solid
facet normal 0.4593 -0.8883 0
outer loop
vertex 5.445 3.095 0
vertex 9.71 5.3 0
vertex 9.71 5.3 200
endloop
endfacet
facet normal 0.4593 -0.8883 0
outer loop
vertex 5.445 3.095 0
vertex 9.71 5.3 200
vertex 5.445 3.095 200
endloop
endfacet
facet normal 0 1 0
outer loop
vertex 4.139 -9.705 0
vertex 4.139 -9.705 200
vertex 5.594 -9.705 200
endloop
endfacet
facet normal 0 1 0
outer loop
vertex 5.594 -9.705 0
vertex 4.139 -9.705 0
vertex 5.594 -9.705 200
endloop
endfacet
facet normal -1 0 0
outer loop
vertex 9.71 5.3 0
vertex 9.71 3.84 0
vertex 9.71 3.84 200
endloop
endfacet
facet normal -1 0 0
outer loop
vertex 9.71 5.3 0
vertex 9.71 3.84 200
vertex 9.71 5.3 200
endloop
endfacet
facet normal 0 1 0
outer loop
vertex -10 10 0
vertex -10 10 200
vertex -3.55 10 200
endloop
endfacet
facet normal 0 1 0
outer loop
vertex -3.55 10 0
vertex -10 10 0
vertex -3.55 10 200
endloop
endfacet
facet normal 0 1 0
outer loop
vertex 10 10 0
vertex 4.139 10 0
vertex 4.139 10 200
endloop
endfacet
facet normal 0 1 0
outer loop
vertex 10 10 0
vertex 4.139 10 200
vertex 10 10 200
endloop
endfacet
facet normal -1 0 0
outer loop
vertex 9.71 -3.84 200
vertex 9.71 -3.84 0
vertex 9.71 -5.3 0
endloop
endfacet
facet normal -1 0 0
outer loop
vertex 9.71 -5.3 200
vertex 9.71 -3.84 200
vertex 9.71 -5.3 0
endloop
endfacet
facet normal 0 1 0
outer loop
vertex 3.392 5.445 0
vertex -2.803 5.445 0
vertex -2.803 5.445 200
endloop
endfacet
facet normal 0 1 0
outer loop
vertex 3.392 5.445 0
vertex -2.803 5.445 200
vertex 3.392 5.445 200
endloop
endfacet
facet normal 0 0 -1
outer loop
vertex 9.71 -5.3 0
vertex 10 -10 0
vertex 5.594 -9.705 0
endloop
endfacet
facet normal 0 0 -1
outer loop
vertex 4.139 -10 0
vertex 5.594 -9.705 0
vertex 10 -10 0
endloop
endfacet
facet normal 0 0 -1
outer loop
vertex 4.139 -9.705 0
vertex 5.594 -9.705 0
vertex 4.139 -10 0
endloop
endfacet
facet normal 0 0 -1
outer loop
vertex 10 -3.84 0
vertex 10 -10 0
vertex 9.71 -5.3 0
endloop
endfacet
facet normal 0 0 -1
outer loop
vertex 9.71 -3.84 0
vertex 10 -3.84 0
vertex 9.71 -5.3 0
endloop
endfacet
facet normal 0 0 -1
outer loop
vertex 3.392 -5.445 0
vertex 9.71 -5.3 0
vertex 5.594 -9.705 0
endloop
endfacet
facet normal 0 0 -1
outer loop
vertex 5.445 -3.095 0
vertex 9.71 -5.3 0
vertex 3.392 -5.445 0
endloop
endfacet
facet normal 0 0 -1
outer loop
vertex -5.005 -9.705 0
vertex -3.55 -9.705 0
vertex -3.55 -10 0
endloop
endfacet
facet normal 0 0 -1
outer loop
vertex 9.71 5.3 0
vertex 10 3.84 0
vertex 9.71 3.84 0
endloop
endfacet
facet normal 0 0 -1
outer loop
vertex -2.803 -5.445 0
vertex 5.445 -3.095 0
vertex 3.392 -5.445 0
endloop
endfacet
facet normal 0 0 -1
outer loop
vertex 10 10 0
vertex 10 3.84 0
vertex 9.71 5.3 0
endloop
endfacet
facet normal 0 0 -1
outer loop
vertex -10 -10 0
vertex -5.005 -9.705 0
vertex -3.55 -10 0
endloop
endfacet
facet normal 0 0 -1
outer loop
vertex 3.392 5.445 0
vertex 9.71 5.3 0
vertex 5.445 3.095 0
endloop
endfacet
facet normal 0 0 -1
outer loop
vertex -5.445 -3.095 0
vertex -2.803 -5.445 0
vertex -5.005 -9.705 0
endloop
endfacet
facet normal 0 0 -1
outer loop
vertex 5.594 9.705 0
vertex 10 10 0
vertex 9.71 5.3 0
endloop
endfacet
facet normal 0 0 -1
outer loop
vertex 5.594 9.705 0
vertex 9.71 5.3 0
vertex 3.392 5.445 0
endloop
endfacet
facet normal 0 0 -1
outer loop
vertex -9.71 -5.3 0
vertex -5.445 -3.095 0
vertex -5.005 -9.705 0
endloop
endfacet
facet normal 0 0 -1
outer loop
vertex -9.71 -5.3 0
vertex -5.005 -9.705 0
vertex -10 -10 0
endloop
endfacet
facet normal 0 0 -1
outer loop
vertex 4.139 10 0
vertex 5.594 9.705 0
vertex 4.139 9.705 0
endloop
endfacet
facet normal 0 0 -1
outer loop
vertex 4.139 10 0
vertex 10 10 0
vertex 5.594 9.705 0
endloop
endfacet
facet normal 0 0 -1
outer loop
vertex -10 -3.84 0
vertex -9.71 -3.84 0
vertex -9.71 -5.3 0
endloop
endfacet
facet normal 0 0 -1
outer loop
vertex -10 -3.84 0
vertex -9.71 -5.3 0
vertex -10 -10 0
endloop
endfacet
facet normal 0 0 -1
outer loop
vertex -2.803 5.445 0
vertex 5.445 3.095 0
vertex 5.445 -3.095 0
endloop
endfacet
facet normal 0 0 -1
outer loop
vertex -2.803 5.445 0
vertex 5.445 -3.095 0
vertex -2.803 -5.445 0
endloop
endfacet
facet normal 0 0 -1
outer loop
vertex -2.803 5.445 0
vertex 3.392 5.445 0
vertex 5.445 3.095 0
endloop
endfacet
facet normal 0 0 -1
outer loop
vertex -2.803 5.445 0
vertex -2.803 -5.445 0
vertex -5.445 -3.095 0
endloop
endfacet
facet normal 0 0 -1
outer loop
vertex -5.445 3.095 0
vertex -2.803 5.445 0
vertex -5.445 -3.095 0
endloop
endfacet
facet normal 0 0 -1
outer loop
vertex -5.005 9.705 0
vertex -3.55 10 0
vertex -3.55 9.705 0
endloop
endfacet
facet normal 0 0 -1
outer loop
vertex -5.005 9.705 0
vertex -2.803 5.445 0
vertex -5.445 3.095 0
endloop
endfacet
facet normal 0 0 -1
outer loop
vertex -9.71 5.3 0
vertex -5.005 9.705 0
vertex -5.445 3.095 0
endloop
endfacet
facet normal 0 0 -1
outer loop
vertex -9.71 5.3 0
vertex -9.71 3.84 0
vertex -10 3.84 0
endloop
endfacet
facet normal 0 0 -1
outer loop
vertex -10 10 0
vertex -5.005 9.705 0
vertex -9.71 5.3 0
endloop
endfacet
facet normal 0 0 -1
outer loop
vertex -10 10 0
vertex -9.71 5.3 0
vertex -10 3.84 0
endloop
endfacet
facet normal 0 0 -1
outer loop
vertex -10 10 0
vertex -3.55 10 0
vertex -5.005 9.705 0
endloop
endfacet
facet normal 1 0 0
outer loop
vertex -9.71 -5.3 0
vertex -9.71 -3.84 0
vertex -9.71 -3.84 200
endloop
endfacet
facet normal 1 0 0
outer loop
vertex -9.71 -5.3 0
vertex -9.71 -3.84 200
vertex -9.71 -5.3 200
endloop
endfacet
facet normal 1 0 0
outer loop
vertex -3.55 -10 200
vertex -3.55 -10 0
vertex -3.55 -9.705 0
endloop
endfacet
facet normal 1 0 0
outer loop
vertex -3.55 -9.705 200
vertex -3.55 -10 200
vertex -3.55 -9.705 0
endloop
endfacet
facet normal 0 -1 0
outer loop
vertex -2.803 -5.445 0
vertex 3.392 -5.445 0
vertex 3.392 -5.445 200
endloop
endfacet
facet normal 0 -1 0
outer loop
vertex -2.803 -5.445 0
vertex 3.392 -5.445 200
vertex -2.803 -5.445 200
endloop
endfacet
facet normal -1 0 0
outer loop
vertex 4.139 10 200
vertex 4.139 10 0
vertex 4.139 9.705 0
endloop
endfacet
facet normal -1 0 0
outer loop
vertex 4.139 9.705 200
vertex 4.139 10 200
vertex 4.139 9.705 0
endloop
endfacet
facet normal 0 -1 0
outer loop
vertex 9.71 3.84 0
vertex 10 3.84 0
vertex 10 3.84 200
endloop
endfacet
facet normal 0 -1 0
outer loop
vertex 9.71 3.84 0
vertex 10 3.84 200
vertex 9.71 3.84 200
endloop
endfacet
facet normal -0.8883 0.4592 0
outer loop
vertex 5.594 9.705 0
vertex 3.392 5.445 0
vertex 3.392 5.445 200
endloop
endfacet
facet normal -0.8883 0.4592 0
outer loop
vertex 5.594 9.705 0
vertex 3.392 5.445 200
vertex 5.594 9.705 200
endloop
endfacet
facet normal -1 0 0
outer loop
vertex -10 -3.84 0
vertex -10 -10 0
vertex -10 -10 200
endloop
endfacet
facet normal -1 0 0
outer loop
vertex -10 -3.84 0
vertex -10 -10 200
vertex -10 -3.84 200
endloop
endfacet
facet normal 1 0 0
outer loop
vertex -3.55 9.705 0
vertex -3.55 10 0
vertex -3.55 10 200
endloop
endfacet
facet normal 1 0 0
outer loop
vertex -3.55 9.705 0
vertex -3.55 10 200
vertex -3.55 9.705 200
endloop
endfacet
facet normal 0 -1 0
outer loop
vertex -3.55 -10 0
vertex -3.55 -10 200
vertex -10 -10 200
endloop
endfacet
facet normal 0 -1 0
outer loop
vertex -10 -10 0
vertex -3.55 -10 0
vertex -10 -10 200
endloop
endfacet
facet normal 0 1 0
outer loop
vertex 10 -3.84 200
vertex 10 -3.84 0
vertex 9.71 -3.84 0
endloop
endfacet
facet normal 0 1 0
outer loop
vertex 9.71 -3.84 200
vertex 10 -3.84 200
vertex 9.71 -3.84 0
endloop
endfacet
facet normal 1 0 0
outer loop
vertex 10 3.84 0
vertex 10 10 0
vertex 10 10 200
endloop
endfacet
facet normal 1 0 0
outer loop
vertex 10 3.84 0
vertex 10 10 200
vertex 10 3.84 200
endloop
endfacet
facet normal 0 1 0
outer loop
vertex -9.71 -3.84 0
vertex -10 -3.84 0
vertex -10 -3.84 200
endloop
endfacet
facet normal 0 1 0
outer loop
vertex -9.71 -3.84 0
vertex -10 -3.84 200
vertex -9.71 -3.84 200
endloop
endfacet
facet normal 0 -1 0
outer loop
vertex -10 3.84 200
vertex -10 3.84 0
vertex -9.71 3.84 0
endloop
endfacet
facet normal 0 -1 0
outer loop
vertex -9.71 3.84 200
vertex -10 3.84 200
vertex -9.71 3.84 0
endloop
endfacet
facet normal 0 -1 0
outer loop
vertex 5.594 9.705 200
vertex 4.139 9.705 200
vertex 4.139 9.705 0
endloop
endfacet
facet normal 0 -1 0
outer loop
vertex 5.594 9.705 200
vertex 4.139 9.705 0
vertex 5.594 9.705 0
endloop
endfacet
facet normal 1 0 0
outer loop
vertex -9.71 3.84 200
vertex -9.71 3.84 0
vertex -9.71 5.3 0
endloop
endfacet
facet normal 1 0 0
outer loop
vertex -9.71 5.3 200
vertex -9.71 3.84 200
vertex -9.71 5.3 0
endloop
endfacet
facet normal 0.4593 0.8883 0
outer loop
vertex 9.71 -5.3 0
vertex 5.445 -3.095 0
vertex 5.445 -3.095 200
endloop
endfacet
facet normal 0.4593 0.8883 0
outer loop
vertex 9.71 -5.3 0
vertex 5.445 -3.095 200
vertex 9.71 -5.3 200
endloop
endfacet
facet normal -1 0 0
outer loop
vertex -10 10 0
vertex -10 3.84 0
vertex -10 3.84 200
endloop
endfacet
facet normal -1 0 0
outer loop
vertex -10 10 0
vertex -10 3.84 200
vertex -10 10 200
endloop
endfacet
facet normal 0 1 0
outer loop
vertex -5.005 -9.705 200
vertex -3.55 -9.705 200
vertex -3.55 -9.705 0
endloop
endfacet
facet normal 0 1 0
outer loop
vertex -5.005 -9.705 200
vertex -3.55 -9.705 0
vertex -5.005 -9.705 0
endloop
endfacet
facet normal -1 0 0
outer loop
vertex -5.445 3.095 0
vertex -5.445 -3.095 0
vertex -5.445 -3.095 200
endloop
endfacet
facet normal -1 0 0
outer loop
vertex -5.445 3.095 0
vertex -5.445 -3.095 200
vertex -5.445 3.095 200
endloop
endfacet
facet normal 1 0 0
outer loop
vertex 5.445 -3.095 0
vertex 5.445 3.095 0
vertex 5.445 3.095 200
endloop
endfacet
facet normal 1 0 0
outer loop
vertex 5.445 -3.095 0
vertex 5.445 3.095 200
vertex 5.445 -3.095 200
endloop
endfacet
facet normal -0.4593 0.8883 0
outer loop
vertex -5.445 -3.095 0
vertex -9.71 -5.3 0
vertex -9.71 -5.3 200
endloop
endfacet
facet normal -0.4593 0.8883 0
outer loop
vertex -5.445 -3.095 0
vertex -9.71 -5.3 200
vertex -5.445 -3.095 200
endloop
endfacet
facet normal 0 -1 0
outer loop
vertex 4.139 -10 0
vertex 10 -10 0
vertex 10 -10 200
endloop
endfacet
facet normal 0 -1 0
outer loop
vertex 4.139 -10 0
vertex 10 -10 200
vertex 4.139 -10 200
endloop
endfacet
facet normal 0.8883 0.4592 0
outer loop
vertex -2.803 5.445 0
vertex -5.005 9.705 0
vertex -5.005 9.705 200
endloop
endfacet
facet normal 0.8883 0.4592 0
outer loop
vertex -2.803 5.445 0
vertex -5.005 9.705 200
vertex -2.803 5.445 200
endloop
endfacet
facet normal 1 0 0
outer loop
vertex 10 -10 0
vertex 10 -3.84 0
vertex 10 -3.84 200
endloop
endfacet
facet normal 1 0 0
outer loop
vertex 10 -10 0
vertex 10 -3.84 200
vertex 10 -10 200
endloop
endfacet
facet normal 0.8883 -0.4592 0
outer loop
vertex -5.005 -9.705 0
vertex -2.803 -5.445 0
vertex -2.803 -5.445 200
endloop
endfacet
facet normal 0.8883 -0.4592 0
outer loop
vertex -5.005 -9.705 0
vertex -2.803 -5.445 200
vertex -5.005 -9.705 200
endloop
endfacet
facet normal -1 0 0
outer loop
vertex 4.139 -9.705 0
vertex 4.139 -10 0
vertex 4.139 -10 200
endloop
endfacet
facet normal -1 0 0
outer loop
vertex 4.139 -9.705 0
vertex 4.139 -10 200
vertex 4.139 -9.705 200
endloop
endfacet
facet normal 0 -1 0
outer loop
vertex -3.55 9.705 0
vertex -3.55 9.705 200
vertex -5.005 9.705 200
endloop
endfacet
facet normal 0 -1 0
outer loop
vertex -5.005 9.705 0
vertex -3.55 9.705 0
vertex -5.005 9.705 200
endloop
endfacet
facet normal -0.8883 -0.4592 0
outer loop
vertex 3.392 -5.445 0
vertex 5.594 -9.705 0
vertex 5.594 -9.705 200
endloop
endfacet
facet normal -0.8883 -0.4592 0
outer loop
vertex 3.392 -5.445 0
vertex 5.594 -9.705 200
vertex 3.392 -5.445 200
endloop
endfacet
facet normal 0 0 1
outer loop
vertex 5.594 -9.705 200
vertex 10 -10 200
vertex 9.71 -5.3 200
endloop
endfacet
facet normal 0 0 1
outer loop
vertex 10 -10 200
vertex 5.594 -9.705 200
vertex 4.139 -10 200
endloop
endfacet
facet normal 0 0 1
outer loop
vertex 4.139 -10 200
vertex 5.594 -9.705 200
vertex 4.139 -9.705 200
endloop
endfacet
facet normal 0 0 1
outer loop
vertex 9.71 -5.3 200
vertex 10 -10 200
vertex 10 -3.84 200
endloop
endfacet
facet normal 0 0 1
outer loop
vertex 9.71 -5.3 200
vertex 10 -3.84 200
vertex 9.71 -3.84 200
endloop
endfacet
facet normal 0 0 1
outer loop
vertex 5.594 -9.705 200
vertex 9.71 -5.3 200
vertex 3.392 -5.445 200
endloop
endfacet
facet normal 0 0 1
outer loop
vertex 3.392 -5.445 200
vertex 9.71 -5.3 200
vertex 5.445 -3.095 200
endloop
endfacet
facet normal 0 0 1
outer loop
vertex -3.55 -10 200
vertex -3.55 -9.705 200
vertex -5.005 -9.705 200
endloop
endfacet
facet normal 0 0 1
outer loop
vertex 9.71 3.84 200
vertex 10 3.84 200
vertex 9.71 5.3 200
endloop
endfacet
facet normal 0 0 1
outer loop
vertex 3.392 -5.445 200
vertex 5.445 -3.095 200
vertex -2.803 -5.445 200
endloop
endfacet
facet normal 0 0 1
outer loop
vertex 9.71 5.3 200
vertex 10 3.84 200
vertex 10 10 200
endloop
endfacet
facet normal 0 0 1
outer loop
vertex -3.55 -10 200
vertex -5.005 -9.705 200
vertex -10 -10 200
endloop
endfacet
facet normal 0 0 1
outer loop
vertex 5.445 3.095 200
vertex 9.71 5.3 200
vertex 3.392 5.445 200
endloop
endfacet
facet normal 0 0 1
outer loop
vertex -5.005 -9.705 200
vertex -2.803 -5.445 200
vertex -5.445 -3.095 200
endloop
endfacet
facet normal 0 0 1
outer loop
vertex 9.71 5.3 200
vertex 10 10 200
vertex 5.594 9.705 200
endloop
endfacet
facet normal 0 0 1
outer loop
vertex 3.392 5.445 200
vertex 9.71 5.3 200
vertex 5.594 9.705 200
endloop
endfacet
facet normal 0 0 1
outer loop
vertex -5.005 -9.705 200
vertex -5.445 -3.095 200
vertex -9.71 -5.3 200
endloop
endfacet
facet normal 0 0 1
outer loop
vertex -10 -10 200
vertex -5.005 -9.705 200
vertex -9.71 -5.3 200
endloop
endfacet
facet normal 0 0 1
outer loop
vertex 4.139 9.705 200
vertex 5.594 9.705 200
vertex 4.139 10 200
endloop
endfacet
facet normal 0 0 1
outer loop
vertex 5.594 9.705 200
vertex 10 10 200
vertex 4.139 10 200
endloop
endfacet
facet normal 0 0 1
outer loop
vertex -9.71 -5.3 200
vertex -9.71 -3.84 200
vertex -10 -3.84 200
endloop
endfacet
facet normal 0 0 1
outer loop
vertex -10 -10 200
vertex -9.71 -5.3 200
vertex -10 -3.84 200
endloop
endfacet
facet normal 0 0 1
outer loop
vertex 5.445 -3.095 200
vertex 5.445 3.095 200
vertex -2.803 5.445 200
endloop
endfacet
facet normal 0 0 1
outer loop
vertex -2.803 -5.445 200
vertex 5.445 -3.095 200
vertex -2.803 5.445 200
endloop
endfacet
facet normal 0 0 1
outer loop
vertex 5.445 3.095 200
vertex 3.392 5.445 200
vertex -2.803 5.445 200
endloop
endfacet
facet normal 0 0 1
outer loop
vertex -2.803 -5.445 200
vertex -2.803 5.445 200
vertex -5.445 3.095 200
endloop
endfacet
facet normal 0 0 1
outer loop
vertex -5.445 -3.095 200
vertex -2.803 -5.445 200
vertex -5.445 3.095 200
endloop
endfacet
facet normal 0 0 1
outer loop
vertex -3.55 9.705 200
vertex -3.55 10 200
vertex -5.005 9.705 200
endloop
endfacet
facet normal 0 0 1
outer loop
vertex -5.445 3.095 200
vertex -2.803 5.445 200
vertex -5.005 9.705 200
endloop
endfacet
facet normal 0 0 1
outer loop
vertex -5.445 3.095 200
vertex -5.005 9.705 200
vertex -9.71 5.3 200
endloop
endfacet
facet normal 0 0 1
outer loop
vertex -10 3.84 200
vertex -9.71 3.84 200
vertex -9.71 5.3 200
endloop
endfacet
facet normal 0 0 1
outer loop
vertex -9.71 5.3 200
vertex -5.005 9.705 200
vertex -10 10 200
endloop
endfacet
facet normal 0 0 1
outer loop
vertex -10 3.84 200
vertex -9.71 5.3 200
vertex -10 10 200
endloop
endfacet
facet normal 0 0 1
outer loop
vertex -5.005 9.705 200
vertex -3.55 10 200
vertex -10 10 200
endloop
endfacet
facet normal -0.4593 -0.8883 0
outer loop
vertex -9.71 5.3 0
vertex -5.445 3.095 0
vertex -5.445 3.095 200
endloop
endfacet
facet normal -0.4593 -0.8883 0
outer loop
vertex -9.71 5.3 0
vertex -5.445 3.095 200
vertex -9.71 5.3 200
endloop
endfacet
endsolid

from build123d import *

# Parameters (mm, degrees)
Y_KSEKLIK_EKSTR_ZYON1_DEPTH = 200
Y_KSEKLIK_EKSTR_ZYON3_DEPTH = 200


with BuildPart() as part:
    # Çizim1 → Yükseklik-Ekstrüzyon1 (new body)
    with BuildSketch(Plane.XY):
        Polygon((-5.15760167, 10), (-2.80302277, 5.444963707), (3.391667495, 5.444963707), (5.746246396, 10), (10, 10), (10, 5.45), (5.445076204, 3.095), (5.445076204, -3.095), (10, -5.45), (10, -10), (5.746246396, -10), (3.391667495, -5.444963707), (-2.80302277, -5.444963707), (-5.15760167, -10), (-10, -10), (-10, -5.45), (-5.445076204, -3.095), (-5.445076204, 3.095), (-10, 5.45), (-10, 10), align=None)
    extrude(amount=Y_KSEKLIK_EKSTR_ZYON1_DEPTH)

    # Çizim4 → Yükseklik-Ekstrüzyon3 (add)
    with BuildSketch(Plane.XY.offset(200)):
        Polygon((-5.15760167, 10), (-3.54995598, 10), (-3.54995598, 9.705121592), (-5.005173801, 9.705121592), align=None)
        Polygon((10, 3.84), (9.71, 3.84), (9.71, 5.300063353), (10, 5.45), align=None)
        Polygon((5.593818526, 9.705121592), (5.746246396, 10), (4.138600705, 10), (4.138600705, 9.705121592), align=None)
        Polygon((5.746246396, -10), (4.138600705, -10), (4.138600705, -9.705121592), (5.593818526, -9.705121592), align=None)
        Polygon((-5.005173801, -9.705121592), (-5.15760167, -10), (-3.54995598, -10), (-3.54995598, -9.705121592), align=None)
        Polygon((-10, 5.45), (-10, 3.84), (-9.71, 3.84), (-9.71, 5.300063353), align=None)
        Polygon((9.71, -5.300063353), (10, -5.45), (10, -3.84), (9.71, -3.84), align=None)
        Polygon((-9.71, -5.300063353), (-10, -5.45), (-10, -3.84), (-9.71, -3.84), align=None)
    extrude(amount=-Y_KSEKLIK_EKSTR_ZYON3_DEPTH)


solid = part.part
